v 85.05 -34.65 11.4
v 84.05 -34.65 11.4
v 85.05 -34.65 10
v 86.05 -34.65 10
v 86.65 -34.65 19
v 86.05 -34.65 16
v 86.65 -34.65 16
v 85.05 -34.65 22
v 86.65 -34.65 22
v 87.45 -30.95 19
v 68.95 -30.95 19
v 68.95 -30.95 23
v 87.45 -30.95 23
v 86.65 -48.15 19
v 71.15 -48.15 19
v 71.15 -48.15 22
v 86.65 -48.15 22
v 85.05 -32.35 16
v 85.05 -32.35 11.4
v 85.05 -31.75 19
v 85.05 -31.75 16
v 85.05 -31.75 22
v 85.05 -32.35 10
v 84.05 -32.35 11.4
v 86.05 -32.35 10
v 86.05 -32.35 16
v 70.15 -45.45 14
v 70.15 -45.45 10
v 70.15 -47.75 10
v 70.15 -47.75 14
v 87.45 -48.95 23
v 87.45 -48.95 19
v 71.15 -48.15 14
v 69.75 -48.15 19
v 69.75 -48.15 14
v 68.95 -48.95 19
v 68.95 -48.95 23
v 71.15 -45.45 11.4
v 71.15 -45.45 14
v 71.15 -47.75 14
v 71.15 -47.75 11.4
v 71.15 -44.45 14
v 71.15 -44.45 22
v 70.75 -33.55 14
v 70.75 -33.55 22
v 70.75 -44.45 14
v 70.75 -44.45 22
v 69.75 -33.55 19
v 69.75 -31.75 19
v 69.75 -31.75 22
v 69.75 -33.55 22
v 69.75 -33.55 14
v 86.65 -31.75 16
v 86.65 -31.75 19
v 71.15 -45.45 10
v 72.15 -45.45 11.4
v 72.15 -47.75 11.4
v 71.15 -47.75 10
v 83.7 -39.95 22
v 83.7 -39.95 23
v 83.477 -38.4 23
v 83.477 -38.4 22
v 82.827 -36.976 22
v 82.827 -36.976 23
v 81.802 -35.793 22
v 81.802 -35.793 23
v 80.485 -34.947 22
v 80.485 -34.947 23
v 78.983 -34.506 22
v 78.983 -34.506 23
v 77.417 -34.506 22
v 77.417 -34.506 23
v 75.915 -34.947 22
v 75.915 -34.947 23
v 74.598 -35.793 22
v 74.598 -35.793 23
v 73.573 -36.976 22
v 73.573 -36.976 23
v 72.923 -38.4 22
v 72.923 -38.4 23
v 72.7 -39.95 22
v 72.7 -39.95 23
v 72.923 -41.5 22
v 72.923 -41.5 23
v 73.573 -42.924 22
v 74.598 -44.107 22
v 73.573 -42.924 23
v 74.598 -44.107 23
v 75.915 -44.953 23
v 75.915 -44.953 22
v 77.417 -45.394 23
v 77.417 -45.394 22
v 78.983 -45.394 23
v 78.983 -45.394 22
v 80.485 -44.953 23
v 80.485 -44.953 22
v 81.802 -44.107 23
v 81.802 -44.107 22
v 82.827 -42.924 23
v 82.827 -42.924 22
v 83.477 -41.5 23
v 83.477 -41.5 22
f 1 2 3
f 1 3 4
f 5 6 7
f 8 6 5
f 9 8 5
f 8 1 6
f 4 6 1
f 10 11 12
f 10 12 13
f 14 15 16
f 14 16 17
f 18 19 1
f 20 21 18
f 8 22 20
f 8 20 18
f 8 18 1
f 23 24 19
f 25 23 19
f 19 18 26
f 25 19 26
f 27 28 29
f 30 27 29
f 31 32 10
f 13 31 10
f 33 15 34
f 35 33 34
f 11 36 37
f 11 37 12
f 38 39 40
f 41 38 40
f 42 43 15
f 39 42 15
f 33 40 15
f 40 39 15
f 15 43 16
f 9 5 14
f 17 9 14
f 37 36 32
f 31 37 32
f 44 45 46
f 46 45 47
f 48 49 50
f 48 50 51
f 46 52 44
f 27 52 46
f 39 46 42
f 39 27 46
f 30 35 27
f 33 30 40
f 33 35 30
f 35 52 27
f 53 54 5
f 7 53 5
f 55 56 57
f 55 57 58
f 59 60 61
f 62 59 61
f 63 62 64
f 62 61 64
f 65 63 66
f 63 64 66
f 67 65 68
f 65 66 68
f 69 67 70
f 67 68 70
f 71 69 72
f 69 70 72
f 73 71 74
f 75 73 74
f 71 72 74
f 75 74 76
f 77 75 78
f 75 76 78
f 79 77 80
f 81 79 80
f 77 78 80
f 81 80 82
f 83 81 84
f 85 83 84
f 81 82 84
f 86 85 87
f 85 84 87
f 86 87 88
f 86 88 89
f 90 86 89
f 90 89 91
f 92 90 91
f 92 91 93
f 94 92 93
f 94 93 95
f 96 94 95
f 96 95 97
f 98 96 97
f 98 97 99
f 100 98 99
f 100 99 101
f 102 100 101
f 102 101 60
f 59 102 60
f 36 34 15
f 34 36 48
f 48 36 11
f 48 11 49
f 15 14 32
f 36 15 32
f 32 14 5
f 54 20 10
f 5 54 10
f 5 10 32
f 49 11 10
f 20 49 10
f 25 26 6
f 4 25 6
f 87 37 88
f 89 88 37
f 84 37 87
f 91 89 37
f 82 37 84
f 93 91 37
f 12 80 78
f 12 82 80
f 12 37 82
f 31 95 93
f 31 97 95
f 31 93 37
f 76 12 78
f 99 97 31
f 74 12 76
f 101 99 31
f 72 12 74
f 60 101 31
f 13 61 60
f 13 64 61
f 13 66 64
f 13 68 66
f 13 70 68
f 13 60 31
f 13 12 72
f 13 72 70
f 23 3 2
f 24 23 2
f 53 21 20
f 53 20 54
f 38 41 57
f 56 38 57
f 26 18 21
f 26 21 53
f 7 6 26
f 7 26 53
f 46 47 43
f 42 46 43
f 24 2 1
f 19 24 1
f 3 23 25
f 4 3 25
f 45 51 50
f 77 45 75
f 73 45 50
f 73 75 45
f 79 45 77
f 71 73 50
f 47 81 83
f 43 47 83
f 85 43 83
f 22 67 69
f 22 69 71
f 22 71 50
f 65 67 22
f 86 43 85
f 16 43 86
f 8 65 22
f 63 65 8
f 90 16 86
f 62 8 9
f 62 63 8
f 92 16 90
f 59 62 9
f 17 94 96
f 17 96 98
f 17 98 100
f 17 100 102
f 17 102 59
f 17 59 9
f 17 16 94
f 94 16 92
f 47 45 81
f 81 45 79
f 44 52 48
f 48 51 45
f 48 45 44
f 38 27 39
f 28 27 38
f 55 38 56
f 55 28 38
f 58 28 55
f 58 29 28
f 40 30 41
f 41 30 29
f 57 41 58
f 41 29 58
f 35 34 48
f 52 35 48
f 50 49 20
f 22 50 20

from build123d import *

# Parameters (mm, degrees)
SKETCH045_W     = 18.5
SKETCH045_H     = 18
PAD029_DEPTH    = 4
SKETCH046_W     = 16.9
SKETCH046_H     = 16.4
POCKET014_DEPTH = 3
SKETCH047_R     = 5.5
POCKET015_DEPTH = 5
SKETCH048_W     = 1
SKETCH048_H     = 2.3
PAD030_DEPTH    = 12
SKETCH049_W     = 1
SKETCH049_H     = 2.3
PAD031_DEPTH    = 1.4
POCKET016_DEPTH = 2.3
POCKET017_DEPTH = 2.3
PAD071_DEPTH    = 8
SKETCH133_W     = 1.6
SKETCH133_H     = 2.9
PAD072_DEPTH    = 6


with BuildPart() as part:
    # Sketch045 → Pad029 (new body)
    with BuildSketch(Plane(origin=(78.2, -39.95, 23), x_dir=(1, 0, 0), z_dir=(0, 0, 1))):
        Rectangle(SKETCH045_W, SKETCH045_H)
    extrude(amount=PAD029_DEPTH)

    # Sketch046 (on Face5 of Pad029) → Pocket014 (cut)
    with BuildSketch(Plane(origin=(0, 0, 23), x_dir=(1, 0, 0), z_dir=(0, 0, -1))):
        with Locations((78.2, 39.95)):
            Rectangle(SKETCH046_W, SKETCH046_H)
    extrude(amount=-POCKET014_DEPTH, mode=Mode.SUBTRACT)

    # Sketch047 (on Face5 of Pocket014) → Pocket015 (cut)
    with BuildSketch(Plane.XY.offset(27)):
        with Locations((78.2, -39.95)):
            Circle(SKETCH047_R)
    extrude(amount=-POCKET015_DEPTH, mode=Mode.SUBTRACT)

    # Sketch048 (on Face12 of Pocket015) → Pad030 (join)
    with BuildSketch(Plane(origin=(0, 0, 26), x_dir=(1, 0, 0), z_dir=(0, 0, -1))):
        with Locations((85.55, 33.5)):
            Rectangle(SKETCH048_W, SKETCH048_H)
        with Locations((70.65, 46.6)):
            Rectangle(SKETCH048_W, SKETCH048_H)
    extrude(amount=PAD030_DEPTH)

    # Sketch049 (on Face21 of Pad030) → Pad031 (join)
    with BuildSketch(Plane(origin=(0, 0, 14), x_dir=(1, 0, 0), z_dir=(0, 0, -1))):
        with Locations((71.65, 46.6)):
            Rectangle(SKETCH049_W, SKETCH049_H)
        with Locations((84.55, 33.5)):
            Rectangle(SKETCH049_W, SKETCH049_H)
    extrude(amount=-PAD031_DEPTH)

    # Sketch050 (on Face24 of Pad031) → Pocket016 (cut)
    with BuildSketch(Plane(origin=(0, -45.45, 0), x_dir=(-1, 0, 0), z_dir=(0, 1, 0))):
        Polygon((-72.15, 15.4), (-71.15, 14), (-72.15, 14), align=None)
    extrude(amount=-POCKET016_DEPTH, mode=Mode.SUBTRACT)

    # Sketch051 (on Face28 of Pocket016) → Pocket017 (cut)
    with BuildSketch(Plane.XZ.offset(34.65)):
        Polygon((85.05, 14), (84.05, 15.4), (84.05, 14), align=None)
    extrude(amount=-POCKET017_DEPTH, mode=Mode.SUBTRACT)

    # Sketch132 (on Face12 of Pocket017) → Pad071 (join)
    with BuildSketch(Plane(origin=(0, 0, 26), x_dir=(1, 0, 0), z_dir=(0, 0, -1))):
        Polygon((71.15, 48.15), (69.75, 48.15), (69.75, 33.55), (70.75, 33.55), (70.75, 44.45), (71.15, 44.45), align=None)
    extrude(amount=PAD071_DEPTH)

    # Sketch133 (on Face18 of Pad071) → Pad072 (join)
    with BuildSketch(Plane(origin=(0, 0, 26), x_dir=(1, 0, 0), z_dir=(0, 0, -1))):
        with Locations((85.85, 33.2)):
            Rectangle(SKETCH133_W, SKETCH133_H)
    extrude(amount=PAD072_DEPTH)


with BuildPart() as part_1:
    # Body015 placement: moved
    add(part.part.moved(Location((0, 0, -4))))


solid = part_1.part
